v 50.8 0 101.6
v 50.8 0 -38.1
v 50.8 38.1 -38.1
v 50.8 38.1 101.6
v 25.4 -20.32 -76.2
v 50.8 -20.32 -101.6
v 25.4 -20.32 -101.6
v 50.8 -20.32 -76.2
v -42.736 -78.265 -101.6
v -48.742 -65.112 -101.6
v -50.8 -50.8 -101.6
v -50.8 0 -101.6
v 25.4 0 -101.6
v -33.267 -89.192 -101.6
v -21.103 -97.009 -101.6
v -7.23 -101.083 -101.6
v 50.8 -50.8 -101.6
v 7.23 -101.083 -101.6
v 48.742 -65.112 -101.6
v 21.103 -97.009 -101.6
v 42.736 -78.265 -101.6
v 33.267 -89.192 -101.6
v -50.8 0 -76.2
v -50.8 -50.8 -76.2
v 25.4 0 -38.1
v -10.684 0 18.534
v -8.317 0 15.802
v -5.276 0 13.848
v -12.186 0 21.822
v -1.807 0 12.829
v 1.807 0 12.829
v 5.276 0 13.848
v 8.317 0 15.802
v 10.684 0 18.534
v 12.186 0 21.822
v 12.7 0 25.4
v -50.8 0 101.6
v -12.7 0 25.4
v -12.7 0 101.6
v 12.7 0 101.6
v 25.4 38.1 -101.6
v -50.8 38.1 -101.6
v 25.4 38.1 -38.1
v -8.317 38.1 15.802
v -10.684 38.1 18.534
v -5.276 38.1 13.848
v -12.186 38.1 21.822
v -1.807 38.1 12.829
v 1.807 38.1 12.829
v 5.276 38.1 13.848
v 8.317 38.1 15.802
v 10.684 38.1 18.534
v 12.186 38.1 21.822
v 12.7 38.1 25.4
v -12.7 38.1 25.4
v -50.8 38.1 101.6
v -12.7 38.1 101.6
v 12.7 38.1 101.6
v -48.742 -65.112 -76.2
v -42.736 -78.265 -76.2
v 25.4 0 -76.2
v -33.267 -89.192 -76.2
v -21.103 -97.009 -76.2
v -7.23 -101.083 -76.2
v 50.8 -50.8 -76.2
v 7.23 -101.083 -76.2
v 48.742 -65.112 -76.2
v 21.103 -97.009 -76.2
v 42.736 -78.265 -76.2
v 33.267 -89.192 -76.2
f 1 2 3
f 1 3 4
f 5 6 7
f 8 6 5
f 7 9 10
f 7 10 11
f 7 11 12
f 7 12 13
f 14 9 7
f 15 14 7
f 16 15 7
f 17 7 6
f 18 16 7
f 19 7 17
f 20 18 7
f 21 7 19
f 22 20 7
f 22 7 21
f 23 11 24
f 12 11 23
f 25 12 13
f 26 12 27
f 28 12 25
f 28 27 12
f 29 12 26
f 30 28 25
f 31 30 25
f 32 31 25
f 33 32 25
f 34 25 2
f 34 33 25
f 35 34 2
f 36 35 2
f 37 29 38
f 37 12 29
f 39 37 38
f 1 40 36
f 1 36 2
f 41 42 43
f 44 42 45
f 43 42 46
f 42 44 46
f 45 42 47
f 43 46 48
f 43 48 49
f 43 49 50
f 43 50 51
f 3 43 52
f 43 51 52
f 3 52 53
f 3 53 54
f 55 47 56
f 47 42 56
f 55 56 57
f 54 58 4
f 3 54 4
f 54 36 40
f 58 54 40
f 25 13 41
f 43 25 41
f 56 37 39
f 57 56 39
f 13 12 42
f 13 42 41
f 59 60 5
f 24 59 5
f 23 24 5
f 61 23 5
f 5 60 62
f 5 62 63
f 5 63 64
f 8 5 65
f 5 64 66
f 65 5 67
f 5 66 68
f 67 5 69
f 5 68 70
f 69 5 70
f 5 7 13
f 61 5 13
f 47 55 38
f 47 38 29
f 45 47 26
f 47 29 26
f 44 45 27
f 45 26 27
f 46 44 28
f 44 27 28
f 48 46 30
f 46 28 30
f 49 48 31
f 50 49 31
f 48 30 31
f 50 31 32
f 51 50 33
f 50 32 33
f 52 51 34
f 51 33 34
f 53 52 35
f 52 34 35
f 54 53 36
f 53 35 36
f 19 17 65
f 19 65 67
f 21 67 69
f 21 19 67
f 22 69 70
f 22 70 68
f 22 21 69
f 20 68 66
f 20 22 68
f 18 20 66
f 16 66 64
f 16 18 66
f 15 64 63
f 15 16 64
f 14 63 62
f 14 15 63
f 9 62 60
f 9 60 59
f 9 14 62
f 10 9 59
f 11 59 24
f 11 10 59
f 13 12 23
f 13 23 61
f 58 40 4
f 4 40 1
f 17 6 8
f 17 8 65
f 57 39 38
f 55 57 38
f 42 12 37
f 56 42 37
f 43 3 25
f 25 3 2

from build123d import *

# Parameters (mm, degrees)
F0_W     = 101.6
F0_H     = 203.2
F1_DEPTH = 38.1
F3_DEPTH = 25.4
F5_DEPTH = 1270
F6_W     = 20.32
F6_H     = 25.4
F7_DEPTH = 25.4


with BuildPart() as f1:
    # F0 (on Front) → F1 (new body)
    with BuildSketch(Plane.XZ):
        Rectangle(F0_W, F0_H)
    extrude(amount=-F1_DEPTH)

    # F4 (on face) → F5 (cut)
    with BuildSketch(Plane.XZ):
        with BuildLine():
            Line((12.7, 101.6), (-12.7, 101.6))
            Line((-12.7, 101.6), (-12.7, 25.4))
            ThreePointArc((-12.7, 25.4), (0, 12.7), (12.7, 25.4))
            Line((12.7, 25.4), (12.7, 101.6))
        make_face()
    extrude(amount=-F5_DEPTH, mode=Mode.SUBTRACT)


with BuildPart() as f3:
    # F2 (on face) → F3 (new body)
    with BuildSketch(Plane(origin=(0, 0, -101.6), x_dir=(1, 0, 0), z_dir=(0, 0, -1))):
        with BuildLine():
            Line((-50.8, 50.8), (-50.8, 0))
            Line((-50.8, 0), (50.8, 0))
            Line((50.8, 0), (50.8, 50.8))
            ThreePointArc((50.8, 50.8), (0, 101.6), (-50.8, 50.8))
        make_face()
    extrude(amount=-F3_DEPTH)


with BuildPart() as f7_tool:
    # F6 (on face) → F7 (new body)
    with BuildSketch(Plane.YZ.offset(50.8)):
        with Locations((-10.16, -88.9)):
            Rectangle(F6_W, F6_H)
        Polygon((0, -38.1), (0, -76.2), (0, -101.6), (38.1, -101.6), (38.1, -76.2), (38.1, -38.1), align=None)
    extrude(amount=-F7_DEPTH)


with BuildPart() as f1_1:
    add(f1.part)

    # F7: cut by f7_tool
    add(f7_tool.part, mode=Mode.SUBTRACT)


with BuildPart() as f3_1:
    add(f3.part)

    # F7: cut by f7_tool
    add(f7_tool.part, mode=Mode.SUBTRACT)


solid = Compound([f1_1.part, f3_1.part])
